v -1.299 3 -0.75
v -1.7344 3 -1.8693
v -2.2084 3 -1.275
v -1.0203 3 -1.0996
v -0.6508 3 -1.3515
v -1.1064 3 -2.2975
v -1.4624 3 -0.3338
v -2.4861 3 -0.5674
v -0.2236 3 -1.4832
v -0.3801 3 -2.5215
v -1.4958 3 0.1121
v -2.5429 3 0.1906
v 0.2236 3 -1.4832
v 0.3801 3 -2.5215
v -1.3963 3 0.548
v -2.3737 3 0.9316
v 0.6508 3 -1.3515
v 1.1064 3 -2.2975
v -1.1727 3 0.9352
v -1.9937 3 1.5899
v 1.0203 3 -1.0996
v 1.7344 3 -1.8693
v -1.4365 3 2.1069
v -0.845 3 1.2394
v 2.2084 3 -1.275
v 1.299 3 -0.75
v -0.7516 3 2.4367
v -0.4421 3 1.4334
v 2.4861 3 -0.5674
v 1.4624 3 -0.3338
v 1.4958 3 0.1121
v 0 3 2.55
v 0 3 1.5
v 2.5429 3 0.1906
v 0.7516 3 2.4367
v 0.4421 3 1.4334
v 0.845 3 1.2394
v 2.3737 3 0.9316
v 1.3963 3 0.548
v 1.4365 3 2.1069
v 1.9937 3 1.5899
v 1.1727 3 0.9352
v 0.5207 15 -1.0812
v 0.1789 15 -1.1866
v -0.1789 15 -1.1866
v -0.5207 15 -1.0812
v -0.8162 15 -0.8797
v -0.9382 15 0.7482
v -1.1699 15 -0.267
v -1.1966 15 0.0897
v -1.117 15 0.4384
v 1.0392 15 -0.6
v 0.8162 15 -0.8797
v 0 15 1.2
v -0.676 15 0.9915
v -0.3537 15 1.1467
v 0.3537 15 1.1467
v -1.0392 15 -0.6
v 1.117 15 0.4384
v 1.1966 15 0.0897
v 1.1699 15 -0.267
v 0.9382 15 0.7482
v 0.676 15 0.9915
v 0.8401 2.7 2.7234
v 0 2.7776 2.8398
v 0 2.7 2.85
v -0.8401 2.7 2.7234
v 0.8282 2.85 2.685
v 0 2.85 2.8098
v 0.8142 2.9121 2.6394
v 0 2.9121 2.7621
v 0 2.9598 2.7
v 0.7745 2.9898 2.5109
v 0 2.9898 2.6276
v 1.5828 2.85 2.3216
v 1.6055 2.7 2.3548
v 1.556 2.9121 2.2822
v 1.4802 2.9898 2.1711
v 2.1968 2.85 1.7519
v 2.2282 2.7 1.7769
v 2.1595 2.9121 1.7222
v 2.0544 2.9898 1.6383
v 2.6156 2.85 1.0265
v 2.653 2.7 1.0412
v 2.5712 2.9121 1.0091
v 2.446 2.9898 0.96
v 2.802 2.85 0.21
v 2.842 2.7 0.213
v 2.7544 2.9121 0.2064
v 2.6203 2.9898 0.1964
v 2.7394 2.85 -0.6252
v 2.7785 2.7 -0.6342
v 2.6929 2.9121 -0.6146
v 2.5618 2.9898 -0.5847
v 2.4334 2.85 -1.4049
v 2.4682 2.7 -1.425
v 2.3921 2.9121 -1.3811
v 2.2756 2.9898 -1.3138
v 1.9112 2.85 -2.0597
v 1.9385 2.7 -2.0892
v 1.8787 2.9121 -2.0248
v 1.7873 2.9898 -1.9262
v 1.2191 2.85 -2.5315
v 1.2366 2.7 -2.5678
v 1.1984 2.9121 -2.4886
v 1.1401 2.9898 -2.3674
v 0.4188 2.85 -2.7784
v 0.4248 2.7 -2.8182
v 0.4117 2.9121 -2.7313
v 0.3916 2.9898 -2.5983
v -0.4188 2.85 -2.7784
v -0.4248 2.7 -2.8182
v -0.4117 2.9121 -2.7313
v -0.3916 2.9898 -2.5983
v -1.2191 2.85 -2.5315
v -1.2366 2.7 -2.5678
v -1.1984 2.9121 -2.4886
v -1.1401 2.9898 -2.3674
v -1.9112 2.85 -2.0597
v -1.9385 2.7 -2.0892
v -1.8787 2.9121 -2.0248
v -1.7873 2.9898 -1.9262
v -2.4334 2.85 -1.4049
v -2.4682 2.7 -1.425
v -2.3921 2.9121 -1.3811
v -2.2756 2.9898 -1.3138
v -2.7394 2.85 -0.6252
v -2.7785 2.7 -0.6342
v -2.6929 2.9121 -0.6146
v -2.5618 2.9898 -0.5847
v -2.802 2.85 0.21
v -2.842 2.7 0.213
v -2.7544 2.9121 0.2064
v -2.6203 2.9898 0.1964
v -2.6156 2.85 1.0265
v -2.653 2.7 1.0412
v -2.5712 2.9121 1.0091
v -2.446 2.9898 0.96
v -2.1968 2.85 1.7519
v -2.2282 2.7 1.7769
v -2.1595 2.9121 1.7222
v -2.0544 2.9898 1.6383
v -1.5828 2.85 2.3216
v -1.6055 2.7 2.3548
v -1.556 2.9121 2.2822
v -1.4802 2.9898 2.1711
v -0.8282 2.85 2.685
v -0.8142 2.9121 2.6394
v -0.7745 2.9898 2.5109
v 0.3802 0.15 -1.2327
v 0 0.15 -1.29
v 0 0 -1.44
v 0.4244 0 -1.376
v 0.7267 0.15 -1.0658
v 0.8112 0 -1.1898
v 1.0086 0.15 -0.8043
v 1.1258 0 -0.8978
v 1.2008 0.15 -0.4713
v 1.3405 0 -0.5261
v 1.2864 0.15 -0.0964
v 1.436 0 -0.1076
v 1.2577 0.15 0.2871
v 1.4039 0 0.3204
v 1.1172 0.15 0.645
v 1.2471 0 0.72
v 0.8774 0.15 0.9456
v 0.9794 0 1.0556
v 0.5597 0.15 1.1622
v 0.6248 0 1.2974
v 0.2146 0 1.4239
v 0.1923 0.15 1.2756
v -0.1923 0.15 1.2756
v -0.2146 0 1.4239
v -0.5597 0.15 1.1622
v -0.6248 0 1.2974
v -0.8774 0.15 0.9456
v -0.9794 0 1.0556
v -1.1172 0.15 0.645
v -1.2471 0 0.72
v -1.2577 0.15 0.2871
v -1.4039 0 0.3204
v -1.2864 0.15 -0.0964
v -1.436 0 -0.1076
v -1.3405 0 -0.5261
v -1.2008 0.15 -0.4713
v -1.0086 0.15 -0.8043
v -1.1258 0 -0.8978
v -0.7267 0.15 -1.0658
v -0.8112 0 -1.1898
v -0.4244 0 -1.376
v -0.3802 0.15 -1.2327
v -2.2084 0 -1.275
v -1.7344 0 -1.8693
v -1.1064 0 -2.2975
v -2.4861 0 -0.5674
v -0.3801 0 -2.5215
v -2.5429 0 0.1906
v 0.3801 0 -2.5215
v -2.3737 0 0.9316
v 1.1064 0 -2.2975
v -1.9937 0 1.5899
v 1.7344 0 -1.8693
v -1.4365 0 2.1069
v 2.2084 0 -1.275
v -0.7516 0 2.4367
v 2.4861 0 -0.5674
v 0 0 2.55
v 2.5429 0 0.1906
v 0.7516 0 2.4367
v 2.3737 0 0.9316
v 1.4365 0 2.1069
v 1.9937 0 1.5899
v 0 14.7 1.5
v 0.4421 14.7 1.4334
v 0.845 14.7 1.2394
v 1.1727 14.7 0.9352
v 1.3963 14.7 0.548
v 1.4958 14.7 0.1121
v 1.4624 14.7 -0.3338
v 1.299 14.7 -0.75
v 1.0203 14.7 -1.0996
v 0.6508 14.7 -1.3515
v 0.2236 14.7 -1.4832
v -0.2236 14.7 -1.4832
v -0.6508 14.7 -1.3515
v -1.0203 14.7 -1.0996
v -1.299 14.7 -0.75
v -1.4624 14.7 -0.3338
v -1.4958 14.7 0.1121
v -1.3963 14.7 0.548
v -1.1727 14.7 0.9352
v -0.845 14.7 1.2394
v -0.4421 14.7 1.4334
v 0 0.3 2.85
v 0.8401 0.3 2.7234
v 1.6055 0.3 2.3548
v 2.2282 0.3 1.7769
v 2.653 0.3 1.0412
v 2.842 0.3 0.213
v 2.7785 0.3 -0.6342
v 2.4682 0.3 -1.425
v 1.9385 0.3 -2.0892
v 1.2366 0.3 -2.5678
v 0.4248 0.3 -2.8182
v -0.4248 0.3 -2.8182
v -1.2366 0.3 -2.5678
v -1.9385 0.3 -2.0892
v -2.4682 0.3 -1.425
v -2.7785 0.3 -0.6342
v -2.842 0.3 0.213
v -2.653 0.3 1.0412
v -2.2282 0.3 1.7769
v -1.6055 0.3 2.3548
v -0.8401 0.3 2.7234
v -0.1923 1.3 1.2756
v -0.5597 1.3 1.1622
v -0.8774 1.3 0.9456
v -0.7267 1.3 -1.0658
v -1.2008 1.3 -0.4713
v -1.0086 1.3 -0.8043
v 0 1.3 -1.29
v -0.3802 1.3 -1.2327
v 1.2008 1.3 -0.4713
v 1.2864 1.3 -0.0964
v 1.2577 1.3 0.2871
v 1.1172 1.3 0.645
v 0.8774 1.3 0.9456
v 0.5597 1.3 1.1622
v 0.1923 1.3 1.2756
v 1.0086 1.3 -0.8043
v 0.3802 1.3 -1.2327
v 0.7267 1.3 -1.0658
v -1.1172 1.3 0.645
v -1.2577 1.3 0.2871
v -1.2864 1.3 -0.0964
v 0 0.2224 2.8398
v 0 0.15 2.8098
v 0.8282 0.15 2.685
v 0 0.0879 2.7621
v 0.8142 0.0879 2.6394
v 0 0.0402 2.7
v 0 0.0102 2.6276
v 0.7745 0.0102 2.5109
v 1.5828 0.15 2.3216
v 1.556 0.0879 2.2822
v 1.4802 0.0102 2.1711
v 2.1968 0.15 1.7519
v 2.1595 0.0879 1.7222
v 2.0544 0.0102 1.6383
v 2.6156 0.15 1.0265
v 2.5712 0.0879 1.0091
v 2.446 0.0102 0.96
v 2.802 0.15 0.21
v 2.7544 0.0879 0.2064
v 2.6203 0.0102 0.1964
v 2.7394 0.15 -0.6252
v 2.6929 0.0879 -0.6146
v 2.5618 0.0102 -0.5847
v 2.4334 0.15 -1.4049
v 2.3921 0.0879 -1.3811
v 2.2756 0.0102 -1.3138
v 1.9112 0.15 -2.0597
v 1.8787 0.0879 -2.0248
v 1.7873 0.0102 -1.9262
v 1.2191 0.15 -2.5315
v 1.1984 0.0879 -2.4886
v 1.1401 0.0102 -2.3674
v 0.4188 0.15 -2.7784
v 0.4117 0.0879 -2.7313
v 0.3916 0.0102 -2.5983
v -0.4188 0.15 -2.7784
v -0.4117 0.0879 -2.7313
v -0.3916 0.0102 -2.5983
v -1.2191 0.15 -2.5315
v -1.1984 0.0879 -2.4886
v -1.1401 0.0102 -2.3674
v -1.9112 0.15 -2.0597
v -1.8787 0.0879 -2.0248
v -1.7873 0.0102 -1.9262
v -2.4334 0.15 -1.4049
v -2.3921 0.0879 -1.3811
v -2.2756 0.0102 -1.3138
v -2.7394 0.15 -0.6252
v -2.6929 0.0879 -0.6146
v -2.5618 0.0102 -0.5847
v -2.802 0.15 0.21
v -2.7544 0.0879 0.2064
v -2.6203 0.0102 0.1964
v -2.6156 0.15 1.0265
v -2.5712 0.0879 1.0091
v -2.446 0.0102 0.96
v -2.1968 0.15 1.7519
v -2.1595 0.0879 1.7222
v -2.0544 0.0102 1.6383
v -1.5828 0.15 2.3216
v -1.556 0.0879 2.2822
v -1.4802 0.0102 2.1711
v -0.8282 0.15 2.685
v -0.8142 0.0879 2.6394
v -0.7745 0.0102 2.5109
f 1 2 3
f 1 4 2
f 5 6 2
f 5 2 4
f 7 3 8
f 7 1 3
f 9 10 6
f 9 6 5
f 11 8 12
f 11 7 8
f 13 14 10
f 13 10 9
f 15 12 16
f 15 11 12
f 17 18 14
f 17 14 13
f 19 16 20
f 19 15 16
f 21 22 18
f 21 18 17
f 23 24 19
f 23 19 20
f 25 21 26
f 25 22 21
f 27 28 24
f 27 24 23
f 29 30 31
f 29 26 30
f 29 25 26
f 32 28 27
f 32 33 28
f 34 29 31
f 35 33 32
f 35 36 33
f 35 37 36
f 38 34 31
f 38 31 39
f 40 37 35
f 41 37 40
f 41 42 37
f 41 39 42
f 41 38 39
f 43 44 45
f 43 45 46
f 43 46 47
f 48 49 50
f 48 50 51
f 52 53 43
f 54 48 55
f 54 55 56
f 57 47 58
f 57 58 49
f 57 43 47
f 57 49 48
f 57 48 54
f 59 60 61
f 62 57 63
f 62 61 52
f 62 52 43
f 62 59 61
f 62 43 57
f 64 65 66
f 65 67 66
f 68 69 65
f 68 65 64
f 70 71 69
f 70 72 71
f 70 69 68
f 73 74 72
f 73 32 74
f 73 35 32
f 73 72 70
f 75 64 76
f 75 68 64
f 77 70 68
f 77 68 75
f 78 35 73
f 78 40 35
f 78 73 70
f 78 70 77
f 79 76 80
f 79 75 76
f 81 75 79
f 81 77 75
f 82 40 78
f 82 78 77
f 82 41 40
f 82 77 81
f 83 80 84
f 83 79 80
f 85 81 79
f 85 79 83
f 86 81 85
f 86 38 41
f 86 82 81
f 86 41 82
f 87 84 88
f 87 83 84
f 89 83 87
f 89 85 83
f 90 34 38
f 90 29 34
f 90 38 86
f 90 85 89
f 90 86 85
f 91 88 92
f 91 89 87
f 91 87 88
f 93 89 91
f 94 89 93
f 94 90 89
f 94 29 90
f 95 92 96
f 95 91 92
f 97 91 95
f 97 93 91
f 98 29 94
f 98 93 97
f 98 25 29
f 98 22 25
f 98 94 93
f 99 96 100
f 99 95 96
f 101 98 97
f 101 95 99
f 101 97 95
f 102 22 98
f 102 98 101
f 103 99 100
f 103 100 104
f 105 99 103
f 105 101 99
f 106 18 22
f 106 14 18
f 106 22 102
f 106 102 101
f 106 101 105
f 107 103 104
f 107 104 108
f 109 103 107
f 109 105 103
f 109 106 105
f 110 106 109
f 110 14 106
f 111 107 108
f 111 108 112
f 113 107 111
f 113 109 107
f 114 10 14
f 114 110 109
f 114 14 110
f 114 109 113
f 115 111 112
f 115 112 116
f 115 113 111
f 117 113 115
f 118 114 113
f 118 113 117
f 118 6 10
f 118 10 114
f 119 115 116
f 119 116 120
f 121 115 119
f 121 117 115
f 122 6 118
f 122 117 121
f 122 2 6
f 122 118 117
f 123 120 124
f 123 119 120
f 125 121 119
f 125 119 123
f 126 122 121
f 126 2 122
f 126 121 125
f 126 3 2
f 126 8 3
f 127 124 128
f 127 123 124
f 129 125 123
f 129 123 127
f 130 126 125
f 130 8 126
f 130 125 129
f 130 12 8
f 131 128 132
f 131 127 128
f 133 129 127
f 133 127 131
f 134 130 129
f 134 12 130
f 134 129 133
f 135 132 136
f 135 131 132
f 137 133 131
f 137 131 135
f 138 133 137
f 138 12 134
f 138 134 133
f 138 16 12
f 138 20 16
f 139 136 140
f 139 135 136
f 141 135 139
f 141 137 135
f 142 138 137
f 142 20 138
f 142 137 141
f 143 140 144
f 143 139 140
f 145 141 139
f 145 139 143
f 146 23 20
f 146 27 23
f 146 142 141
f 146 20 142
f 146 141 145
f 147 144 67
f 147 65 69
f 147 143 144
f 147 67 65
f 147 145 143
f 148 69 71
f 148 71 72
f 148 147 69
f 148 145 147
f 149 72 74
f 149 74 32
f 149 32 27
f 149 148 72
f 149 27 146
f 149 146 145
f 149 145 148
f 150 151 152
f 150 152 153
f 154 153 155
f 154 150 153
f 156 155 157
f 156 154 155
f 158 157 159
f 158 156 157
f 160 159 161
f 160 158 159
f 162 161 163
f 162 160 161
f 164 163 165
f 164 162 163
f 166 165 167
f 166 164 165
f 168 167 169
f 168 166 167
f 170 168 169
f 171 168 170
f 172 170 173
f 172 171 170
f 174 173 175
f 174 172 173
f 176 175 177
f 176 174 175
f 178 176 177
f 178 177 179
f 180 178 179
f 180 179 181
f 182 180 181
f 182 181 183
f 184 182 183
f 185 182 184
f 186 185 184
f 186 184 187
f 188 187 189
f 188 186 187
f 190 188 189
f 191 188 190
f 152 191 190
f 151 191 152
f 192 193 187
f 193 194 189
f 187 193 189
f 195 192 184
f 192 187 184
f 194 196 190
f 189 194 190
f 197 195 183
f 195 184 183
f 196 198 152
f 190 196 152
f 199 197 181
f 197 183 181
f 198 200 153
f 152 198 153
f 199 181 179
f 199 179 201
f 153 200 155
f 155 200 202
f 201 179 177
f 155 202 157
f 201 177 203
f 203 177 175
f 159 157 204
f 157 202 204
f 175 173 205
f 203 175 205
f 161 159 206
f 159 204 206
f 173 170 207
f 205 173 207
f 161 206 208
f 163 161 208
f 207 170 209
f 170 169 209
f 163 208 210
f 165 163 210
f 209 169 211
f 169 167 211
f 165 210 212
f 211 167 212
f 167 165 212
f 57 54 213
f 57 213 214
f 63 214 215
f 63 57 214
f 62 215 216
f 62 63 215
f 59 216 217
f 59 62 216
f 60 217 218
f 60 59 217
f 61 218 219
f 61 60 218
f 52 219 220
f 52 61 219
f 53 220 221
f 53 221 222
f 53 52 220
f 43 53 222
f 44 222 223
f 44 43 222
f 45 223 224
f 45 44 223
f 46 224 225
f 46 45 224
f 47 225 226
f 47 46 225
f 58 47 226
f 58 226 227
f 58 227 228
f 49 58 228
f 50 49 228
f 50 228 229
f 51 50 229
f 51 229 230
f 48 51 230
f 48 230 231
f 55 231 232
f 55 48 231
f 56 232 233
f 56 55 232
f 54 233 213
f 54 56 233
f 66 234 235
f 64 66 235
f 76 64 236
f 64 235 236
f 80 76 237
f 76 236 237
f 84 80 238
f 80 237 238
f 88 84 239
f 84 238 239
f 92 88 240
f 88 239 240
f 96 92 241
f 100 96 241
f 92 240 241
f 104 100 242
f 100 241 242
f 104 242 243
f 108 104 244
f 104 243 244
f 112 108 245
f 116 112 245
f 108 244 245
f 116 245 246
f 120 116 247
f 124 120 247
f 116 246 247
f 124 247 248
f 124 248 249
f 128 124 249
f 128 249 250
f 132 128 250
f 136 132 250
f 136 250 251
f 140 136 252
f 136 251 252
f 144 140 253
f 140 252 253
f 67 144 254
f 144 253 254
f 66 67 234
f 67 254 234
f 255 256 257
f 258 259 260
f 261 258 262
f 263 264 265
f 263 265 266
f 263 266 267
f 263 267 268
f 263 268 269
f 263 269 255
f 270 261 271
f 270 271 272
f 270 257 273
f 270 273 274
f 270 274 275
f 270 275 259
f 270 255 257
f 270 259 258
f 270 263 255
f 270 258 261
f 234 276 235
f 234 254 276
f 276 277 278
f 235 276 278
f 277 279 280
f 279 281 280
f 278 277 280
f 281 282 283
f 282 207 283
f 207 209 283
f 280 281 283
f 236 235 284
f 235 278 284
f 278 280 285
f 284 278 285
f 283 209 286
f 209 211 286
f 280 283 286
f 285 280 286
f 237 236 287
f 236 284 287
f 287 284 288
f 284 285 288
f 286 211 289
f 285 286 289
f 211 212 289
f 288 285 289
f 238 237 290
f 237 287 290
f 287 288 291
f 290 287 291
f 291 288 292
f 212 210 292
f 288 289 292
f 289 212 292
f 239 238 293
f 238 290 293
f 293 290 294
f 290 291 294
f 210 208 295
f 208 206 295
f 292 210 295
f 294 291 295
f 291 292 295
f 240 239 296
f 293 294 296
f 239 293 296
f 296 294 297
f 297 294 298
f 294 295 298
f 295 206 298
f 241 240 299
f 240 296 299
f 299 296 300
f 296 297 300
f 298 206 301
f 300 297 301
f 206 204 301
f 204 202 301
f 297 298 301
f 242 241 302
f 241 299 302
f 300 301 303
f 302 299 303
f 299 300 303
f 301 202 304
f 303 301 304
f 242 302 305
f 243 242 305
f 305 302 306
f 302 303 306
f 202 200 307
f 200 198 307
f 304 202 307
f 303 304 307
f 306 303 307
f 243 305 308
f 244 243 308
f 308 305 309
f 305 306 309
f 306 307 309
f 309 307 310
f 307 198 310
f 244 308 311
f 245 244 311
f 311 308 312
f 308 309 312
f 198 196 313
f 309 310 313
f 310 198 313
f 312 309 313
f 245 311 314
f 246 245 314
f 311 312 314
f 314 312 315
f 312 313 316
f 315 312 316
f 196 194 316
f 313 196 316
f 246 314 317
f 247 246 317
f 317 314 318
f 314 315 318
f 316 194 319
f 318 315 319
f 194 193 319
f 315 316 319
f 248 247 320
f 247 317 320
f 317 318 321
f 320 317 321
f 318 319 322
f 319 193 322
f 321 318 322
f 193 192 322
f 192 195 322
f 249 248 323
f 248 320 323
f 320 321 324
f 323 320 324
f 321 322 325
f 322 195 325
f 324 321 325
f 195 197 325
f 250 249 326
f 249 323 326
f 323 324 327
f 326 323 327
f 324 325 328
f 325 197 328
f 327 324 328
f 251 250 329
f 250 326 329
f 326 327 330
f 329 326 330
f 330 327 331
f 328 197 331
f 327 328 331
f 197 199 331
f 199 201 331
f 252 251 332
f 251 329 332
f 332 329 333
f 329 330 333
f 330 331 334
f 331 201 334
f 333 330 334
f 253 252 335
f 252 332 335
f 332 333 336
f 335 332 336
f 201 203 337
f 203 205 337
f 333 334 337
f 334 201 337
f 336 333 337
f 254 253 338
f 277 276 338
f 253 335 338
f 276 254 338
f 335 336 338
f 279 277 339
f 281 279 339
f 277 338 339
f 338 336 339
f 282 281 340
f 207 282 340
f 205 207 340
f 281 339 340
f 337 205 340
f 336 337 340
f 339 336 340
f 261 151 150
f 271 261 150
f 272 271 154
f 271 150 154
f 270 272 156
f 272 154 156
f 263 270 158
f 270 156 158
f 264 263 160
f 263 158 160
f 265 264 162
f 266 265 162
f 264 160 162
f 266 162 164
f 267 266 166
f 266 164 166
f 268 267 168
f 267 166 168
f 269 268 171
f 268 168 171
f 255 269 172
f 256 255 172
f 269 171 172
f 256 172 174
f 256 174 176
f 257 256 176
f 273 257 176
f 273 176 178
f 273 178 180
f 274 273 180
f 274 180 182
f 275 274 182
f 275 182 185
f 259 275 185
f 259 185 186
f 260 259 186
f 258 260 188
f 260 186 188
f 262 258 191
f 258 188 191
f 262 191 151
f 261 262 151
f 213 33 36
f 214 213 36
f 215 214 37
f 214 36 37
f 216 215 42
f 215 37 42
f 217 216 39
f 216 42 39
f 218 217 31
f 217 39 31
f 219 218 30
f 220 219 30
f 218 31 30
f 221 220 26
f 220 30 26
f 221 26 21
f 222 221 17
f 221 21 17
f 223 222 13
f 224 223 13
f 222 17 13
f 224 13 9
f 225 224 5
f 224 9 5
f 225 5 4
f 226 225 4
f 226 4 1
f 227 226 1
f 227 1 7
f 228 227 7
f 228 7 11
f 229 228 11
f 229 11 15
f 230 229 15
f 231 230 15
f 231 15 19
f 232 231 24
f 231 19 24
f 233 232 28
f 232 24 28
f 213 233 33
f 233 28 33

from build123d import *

# Parameters (mm, degrees)
SKETCH_1_R          = 2.85
EXTRUDE_1_DEPTH     = 3
SKETCH_2_R          = 1.5
EXTRUDE_2_DEPTH     = 12
SKETCH_3_R          = 1.29
CUT_EXTRUDE_1_DEPTH = 1.3
FILLET_1_R          = 0.3
CHAMFER_1_SIZE      = 0.3
CHAMFER_2_SIZE      = 0.15


with BuildPart() as part:
    # 草图1 → 凸台-拉伸1 (new body)
    with BuildSketch(Plane(origin=(0, 0, 0), x_dir=(1, 0, 0), z_dir=(0, 1, 0))):
        with Locations(Location((0, 0, 0), (0, 0, 270))):
            Circle(SKETCH_1_R)
    extrude(amount=EXTRUDE_1_DEPTH)

    # 草图2 → 凸台-拉伸2 (add)
    with BuildSketch(Plane(origin=(0, 3, 0), x_dir=(1, 0, 0), z_dir=(0, 1, 0))):
        with Locations(Location((0, 0, 0), (0, 0, 270))):
            Circle(SKETCH_2_R)
    extrude(amount=EXTRUDE_2_DEPTH)

    # 草图3 → 切除-拉伸1 (cut)
    with BuildSketch(Plane.XZ):
        with Locations(Location((0, 0, 0), (0, 0, 270))):
            Circle(SKETCH_3_R)
    extrude(amount=-CUT_EXTRUDE_1_DEPTH, mode=Mode.SUBTRACT)

    # 圆角1
    fillet_1_edges = [part.edges().sort_by_distance(p)[0] for p in [
        (0, 0, -2.85),
        (0, 3, -2.85),
    ]]
    fillet(fillet_1_edges, radius=FILLET_1_R)

    # 倒角1
    chamfer_1_edges = [part.edges().sort_by_distance(p)[0] for p in [
        (0, 15, -1.5),
    ]]
    chamfer(chamfer_1_edges, length=CHAMFER_1_SIZE)

    # 倒角2
    chamfer_2_edges = [part.edges().sort_by_distance(p)[0] for p in [
        (0, 0, 1.29),
    ]]
    chamfer(chamfer_2_edges, length=CHAMFER_2_SIZE)


solid = part.part
